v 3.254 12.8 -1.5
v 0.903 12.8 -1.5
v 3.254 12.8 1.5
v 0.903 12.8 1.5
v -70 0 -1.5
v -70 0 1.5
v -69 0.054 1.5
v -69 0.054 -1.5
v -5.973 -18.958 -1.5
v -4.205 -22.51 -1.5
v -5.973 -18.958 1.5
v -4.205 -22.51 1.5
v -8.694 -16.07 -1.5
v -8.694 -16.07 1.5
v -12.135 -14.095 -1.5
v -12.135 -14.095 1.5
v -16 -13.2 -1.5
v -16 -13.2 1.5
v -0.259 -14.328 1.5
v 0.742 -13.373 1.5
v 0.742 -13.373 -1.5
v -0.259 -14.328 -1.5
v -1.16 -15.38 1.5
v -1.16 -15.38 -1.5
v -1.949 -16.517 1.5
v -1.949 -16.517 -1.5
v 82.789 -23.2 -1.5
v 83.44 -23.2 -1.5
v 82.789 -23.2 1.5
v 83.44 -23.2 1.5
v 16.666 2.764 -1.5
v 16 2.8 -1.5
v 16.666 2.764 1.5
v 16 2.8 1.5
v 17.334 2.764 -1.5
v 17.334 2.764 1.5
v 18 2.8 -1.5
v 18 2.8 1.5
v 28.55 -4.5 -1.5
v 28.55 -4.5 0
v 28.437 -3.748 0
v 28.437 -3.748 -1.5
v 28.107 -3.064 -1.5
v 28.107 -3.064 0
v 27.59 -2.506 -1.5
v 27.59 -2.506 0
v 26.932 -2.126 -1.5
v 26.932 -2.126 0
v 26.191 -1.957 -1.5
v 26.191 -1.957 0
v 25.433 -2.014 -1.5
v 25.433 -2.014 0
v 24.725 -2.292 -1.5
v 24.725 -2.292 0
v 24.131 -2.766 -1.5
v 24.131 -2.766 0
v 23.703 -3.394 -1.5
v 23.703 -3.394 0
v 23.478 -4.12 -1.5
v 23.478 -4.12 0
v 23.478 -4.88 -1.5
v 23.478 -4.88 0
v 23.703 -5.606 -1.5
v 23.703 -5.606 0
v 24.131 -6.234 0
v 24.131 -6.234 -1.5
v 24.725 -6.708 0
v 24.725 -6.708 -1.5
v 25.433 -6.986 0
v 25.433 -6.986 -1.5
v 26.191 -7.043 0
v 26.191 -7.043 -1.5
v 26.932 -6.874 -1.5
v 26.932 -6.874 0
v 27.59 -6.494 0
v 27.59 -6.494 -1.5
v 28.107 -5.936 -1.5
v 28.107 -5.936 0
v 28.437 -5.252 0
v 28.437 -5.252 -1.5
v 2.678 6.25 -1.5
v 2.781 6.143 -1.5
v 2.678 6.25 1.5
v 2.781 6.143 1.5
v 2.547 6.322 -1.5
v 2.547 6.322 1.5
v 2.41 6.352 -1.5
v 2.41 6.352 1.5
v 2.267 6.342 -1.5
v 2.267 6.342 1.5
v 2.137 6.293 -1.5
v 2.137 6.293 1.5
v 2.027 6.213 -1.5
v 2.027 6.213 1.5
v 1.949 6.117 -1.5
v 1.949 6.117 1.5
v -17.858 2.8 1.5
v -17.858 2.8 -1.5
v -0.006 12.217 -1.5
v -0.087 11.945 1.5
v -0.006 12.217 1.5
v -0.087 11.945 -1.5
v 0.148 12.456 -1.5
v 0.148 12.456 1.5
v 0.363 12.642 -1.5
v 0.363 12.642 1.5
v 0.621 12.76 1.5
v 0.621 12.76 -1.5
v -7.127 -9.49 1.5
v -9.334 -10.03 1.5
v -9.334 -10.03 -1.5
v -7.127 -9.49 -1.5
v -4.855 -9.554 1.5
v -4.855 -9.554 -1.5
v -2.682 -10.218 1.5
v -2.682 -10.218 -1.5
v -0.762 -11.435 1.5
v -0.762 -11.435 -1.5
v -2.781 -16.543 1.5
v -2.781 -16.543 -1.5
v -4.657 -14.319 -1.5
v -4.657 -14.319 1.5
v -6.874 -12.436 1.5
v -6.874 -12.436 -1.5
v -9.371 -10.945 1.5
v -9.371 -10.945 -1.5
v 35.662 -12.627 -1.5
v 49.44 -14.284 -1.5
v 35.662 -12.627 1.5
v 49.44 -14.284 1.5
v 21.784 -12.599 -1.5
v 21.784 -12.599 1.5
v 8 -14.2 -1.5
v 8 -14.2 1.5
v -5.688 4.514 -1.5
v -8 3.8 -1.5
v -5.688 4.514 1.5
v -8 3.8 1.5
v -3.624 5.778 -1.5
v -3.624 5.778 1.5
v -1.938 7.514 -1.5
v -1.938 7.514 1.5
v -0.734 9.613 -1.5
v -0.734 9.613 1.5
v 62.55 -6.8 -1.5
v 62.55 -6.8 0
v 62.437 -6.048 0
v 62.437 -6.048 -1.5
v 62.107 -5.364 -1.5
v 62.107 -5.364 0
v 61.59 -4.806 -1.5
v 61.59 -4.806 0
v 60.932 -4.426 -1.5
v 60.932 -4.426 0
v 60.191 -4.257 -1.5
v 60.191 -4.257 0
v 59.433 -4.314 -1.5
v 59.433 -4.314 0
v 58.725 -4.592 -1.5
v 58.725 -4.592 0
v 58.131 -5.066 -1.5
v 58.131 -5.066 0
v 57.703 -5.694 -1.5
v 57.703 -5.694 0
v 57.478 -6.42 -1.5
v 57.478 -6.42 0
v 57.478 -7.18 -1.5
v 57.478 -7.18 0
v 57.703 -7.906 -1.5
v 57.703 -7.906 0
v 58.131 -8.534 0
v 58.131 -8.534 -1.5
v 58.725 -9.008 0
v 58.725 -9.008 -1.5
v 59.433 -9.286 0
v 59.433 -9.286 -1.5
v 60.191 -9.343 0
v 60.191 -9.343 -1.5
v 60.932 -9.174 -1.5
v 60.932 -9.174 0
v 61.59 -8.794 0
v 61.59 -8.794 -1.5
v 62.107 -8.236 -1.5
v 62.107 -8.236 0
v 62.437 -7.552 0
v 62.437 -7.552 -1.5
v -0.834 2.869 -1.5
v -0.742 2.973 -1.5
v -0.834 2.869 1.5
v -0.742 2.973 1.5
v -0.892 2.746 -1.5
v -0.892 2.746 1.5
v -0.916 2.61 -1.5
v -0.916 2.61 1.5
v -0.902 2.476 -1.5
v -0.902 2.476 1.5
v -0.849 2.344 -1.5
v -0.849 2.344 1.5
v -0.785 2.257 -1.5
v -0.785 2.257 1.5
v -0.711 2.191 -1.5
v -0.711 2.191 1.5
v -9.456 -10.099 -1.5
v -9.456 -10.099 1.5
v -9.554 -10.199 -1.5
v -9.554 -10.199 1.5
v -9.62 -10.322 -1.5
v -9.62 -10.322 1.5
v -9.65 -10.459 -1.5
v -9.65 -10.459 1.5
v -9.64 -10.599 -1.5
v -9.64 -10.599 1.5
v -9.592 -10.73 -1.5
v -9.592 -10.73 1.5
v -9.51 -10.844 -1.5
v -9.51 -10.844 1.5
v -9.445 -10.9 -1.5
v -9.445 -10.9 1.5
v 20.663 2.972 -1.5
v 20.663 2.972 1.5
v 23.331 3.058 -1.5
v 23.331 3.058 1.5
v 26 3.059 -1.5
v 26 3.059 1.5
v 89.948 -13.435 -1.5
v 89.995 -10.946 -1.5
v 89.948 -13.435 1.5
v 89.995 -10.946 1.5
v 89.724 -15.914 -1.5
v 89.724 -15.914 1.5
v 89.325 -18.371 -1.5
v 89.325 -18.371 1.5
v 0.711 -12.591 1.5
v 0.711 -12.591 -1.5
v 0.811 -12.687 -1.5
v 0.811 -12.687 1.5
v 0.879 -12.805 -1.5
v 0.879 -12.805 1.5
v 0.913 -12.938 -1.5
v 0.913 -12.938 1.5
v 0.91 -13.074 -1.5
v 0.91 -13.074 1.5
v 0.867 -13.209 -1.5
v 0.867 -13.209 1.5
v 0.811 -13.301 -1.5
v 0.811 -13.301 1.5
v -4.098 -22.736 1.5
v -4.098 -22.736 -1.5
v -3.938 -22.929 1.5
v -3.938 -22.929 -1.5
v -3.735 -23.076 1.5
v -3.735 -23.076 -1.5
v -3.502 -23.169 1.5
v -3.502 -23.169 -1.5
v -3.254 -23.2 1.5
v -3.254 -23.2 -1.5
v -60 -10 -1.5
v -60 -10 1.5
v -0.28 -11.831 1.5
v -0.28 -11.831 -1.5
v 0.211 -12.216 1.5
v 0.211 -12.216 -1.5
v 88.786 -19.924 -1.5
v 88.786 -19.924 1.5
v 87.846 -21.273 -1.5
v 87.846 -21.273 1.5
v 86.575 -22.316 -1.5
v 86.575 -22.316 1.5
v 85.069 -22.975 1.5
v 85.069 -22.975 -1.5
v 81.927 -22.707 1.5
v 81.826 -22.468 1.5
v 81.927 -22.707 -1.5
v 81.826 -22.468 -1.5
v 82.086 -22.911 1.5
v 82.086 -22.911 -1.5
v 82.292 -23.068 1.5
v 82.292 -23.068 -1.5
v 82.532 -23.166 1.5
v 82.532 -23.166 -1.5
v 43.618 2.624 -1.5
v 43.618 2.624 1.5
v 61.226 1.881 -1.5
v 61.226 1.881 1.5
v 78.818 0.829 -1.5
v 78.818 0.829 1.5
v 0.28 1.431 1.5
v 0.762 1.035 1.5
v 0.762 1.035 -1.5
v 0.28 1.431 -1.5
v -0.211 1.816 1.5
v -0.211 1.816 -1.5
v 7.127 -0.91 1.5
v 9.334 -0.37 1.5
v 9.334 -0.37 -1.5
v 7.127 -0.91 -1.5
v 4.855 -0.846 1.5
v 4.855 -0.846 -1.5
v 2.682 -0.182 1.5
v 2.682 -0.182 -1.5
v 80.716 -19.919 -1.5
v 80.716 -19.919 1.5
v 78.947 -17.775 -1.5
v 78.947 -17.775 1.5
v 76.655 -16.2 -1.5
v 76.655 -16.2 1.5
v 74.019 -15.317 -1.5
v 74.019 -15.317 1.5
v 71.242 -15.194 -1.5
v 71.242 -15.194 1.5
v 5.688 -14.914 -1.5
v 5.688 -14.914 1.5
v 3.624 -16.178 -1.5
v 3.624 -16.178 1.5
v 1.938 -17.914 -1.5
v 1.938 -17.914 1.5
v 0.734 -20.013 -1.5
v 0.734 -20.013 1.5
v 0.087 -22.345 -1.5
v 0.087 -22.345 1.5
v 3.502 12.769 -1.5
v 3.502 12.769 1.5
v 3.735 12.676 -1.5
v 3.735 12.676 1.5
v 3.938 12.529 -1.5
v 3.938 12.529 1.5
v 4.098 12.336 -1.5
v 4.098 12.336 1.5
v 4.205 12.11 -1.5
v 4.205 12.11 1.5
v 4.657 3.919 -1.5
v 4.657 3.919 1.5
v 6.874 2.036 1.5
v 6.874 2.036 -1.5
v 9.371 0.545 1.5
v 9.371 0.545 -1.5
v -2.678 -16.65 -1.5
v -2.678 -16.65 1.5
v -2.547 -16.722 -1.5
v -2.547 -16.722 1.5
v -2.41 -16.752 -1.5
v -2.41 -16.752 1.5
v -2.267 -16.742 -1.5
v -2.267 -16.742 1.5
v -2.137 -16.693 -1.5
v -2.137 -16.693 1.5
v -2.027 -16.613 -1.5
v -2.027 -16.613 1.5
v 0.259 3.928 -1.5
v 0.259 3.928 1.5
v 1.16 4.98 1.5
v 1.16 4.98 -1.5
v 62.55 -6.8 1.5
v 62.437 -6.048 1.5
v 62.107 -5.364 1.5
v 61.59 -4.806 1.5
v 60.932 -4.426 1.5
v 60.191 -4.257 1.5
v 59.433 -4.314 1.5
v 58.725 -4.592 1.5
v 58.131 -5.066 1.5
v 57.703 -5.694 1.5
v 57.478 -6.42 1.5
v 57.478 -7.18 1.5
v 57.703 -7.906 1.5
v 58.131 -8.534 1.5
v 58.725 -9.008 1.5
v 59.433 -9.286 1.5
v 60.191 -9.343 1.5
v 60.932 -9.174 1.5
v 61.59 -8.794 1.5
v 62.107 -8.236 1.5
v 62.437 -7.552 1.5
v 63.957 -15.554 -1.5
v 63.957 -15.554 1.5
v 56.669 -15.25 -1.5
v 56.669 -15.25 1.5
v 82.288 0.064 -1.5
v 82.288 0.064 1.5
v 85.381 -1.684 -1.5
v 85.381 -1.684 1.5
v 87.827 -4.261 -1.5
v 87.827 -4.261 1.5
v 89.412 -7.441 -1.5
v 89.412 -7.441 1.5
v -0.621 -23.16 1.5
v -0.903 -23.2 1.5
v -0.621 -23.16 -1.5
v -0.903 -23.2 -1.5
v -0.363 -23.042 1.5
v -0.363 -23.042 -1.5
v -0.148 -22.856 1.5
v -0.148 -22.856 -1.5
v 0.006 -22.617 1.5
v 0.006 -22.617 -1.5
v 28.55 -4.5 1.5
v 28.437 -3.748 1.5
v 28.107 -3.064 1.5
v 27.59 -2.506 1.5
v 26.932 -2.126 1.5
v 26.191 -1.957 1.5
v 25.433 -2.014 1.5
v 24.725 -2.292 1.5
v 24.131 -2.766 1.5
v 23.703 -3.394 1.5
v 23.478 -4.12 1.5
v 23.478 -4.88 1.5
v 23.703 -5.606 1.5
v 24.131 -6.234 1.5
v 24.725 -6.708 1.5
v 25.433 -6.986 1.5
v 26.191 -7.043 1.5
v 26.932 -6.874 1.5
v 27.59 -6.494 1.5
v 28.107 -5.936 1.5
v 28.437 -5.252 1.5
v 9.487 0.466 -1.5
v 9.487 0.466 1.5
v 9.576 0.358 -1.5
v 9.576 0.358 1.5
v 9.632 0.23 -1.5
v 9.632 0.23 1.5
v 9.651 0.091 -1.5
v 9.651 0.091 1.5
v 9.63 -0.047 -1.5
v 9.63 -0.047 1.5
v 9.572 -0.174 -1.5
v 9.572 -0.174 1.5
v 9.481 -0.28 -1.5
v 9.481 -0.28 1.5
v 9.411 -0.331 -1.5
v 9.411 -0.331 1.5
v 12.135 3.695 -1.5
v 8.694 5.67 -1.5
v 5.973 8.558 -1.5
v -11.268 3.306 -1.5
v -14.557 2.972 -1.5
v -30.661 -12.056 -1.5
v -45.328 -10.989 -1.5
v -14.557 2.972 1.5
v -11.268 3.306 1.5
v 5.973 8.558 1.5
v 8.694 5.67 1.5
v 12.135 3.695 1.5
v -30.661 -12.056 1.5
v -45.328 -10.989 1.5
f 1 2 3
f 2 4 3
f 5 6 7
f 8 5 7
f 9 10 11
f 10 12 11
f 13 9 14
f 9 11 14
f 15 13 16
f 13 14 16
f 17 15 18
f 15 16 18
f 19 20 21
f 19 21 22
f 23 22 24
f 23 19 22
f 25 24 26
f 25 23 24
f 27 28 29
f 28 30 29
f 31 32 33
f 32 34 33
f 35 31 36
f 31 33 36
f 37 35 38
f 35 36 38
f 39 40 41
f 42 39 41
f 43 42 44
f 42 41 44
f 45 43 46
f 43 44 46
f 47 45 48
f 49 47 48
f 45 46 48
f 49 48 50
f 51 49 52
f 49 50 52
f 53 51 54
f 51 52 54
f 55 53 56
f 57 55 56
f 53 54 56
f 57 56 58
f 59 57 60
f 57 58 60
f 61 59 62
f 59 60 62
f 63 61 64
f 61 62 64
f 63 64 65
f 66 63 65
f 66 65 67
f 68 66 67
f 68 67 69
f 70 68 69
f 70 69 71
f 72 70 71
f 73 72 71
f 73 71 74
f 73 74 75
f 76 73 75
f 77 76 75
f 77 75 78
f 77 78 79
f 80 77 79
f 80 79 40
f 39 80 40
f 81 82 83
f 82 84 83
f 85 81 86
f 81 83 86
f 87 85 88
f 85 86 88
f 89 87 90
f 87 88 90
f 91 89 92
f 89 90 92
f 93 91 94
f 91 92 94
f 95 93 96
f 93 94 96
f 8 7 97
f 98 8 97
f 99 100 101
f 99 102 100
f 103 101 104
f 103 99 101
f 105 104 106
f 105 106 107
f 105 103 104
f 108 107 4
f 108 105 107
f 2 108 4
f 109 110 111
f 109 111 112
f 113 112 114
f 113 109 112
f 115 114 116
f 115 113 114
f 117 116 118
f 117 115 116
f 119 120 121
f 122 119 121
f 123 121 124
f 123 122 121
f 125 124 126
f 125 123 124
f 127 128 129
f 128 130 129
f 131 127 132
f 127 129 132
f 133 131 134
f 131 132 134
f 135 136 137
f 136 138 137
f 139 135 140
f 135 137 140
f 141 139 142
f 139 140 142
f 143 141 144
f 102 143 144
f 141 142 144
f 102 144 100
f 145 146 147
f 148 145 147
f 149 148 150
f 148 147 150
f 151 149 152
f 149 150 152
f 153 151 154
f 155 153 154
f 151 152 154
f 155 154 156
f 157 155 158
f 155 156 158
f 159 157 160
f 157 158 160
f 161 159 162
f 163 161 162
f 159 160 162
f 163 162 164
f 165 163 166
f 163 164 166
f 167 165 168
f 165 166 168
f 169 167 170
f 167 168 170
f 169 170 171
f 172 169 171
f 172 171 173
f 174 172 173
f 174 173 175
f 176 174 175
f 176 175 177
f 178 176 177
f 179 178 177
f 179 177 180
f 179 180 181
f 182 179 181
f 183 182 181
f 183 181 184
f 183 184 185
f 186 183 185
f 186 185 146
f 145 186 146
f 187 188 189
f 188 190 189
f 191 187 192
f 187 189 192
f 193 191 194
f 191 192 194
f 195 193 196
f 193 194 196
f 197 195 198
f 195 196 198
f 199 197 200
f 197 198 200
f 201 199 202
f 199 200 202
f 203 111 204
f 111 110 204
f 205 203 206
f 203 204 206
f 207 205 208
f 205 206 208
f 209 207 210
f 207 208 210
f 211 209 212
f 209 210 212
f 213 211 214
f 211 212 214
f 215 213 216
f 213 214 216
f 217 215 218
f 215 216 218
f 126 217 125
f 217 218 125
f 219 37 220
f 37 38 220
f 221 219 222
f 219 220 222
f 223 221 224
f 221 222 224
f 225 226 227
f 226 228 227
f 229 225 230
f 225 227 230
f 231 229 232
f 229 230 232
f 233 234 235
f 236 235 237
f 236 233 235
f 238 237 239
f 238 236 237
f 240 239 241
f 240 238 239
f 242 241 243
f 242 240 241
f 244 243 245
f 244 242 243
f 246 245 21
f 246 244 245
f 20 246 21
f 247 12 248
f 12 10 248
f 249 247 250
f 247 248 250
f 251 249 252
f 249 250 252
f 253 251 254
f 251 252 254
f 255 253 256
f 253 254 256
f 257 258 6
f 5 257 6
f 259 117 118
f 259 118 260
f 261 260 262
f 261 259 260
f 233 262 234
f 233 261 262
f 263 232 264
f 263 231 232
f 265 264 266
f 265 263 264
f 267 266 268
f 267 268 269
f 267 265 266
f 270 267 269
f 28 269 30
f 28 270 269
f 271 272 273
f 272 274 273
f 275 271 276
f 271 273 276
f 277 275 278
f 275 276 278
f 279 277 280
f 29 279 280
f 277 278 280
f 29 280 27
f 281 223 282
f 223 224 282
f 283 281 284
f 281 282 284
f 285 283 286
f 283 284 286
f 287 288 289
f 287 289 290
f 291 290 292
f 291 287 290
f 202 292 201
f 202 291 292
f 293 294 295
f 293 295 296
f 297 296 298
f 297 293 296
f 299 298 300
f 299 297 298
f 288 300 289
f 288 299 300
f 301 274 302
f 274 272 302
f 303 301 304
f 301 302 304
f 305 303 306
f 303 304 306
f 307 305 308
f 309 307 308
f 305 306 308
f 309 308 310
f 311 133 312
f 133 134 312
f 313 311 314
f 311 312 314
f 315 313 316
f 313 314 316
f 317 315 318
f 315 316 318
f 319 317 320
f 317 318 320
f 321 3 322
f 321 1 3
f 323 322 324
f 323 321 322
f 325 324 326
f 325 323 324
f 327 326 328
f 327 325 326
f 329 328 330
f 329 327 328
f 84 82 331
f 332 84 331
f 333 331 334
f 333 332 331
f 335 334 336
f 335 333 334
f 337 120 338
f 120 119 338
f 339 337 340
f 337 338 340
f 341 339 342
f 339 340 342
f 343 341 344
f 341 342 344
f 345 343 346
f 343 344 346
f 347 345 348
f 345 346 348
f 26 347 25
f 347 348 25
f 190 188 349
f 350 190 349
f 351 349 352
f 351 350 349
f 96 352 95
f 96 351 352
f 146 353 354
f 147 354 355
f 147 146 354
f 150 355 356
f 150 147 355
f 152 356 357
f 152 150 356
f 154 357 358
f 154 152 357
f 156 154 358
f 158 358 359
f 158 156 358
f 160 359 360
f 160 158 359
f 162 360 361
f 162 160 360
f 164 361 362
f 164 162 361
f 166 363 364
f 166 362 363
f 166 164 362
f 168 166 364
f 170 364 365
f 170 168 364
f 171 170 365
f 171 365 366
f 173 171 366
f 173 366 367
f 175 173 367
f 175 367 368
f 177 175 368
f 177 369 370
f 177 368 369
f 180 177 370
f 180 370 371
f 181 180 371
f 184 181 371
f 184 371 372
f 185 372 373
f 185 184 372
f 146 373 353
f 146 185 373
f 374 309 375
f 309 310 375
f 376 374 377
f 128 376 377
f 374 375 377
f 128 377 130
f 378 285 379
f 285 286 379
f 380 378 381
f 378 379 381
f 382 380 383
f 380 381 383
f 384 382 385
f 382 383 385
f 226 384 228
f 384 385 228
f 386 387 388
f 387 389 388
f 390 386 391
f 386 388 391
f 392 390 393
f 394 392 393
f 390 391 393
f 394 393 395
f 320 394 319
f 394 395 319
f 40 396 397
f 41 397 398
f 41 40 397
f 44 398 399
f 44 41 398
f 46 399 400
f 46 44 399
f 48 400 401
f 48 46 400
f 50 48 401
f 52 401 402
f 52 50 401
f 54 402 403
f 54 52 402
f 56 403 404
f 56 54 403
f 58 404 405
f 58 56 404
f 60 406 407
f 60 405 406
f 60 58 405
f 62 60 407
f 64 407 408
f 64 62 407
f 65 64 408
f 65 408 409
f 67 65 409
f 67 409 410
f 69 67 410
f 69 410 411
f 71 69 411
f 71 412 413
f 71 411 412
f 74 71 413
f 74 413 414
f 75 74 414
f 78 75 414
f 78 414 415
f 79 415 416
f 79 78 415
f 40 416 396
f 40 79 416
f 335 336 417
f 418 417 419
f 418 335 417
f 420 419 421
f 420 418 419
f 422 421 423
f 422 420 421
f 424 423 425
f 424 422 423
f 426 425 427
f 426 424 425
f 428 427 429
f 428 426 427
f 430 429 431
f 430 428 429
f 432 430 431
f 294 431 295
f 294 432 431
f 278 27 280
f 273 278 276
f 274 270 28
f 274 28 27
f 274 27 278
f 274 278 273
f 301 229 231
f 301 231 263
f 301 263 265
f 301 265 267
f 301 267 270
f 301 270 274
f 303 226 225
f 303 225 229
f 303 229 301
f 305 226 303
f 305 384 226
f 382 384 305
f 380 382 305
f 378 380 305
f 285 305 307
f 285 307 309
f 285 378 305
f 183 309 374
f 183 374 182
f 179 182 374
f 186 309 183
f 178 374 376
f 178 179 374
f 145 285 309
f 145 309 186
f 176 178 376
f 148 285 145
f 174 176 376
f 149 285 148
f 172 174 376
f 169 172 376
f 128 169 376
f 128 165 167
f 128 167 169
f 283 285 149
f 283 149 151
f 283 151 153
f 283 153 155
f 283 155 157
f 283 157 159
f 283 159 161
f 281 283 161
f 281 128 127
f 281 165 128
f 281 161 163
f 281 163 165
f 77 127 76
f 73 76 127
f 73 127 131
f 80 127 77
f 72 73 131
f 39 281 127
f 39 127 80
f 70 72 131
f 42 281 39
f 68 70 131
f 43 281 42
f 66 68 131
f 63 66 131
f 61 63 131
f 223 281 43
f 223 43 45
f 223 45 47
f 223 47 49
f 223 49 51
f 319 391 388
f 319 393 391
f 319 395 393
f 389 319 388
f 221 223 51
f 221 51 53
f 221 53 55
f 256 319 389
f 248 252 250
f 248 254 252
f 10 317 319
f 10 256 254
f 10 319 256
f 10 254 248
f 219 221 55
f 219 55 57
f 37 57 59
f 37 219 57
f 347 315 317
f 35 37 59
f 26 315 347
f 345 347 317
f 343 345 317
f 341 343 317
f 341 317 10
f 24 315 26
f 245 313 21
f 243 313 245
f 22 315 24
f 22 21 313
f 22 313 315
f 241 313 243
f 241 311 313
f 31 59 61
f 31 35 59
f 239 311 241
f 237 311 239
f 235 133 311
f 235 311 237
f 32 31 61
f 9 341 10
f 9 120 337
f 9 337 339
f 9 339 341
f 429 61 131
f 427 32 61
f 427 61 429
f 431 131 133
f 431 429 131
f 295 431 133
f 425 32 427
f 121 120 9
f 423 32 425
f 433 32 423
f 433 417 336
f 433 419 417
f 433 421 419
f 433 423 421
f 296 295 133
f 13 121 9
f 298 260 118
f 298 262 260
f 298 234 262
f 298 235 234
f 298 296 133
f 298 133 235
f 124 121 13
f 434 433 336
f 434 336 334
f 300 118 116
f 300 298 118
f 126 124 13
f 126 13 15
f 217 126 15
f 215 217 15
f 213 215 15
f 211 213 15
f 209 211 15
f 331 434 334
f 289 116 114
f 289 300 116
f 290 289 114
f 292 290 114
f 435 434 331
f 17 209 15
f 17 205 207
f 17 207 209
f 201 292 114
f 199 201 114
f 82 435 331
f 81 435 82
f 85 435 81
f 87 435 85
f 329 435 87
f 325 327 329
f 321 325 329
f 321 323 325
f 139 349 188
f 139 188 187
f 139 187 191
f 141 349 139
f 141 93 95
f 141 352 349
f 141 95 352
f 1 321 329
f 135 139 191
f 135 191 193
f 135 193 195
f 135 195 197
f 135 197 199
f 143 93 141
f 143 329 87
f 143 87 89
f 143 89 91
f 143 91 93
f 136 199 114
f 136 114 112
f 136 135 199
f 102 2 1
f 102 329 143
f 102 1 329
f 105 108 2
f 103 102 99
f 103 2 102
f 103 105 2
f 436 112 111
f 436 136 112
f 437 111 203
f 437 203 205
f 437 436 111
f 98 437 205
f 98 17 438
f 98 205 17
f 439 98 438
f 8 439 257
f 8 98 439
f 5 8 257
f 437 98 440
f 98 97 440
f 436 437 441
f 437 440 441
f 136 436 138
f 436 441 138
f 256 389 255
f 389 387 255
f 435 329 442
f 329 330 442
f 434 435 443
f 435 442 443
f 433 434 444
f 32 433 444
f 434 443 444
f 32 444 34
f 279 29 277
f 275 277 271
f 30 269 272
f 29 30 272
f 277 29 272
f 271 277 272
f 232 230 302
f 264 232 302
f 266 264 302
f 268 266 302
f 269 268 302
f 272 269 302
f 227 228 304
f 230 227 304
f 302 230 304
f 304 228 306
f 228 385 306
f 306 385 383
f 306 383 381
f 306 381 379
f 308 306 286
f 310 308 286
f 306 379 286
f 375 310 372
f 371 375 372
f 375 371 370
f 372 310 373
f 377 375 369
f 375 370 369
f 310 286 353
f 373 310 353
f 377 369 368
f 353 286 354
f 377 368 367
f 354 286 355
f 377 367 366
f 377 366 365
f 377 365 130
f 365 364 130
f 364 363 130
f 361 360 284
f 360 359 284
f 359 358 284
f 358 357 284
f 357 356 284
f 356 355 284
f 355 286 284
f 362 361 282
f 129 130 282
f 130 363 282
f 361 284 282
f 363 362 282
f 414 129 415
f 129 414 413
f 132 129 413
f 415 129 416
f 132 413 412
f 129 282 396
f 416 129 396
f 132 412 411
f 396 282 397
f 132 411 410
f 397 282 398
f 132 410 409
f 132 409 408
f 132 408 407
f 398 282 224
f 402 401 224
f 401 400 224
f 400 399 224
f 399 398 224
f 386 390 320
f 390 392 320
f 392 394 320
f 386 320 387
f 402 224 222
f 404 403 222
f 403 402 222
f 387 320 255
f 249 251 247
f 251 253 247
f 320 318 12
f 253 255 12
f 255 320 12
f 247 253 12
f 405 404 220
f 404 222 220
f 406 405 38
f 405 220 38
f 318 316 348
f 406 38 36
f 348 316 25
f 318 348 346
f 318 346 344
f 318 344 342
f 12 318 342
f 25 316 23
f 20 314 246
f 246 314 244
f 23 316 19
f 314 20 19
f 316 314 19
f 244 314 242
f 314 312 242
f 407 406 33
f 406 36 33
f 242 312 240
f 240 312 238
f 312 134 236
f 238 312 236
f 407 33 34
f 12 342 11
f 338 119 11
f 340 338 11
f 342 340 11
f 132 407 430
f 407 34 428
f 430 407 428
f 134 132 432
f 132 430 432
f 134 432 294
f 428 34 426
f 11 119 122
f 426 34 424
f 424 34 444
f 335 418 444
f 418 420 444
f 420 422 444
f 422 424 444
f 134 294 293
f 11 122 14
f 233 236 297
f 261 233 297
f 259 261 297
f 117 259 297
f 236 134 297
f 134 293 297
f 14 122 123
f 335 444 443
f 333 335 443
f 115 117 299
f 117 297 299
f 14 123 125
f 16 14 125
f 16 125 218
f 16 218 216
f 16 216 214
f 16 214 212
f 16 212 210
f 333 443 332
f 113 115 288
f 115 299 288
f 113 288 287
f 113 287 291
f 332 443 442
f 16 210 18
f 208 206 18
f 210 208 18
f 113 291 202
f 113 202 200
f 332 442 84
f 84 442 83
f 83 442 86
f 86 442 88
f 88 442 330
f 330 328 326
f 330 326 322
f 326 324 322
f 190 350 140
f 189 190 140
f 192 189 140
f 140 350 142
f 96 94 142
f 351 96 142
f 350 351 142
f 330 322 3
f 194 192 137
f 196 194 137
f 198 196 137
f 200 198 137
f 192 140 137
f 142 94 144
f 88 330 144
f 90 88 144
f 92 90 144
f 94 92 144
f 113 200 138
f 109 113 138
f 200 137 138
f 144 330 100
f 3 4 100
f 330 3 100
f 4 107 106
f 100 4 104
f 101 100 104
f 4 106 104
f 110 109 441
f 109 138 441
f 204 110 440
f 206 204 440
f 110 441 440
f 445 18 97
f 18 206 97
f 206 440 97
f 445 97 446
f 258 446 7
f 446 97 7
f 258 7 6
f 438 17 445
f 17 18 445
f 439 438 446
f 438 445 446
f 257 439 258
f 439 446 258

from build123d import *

# Parameters (mm, degrees)
EXTRUDE_1_DEPTH          = 1.5
CUT_EXTRUDE_1_DEPTH      = 2.5
CUT_EXTRUDE_1_DEPTH_BACK = 2.5
FILLET_2_R               = 0.5
SKETCH_1_3_R             = 2.55
CUT_EXTRUDE_2_DEPTH      = 2.5000001
CUT_EXTRUDE_2_DEPTH_BACK = 2.5000001
FILLET_3_R               = 1
FILLET_4_R               = 6


with BuildPart() as part:
    # 草图3 → 凸台-拉伸1 (new body, symmetric)
    with BuildSketch(Plane.XY):
        with BuildLine():
            Line((-69, 0.053699407), (-17.857896917, 2.8))
            ThreePointArc((-17.857896917, 2.8), (-12.910589699, 3.119021237), (-8, 3.8))
            ThreePointArc((-8, 3.8), (-2.43432215, 6.908286356), (0, 12.8))
            Line((0, 12.8), (4, 12.8))
            ThreePointArc((4, 12.8), (8.414270073, 5.897124087), (16, 2.8))
            ThreePointArc((16, 2.8), (17, 2.759720994), (18, 2.8))
            ThreePointArc((18, 2.8), (21.996883494, 3.025702827), (26, 3.058530741))
            ThreePointArc((26, 3.058530741), (52.423511602, 2.290913304), (78.817734107, 0.82933187))
            ThreePointArc((78.817734107, 0.82933187), (86.700158242, -2.881010306), (89.995283198, -10.945835216))
            ThreePointArc((89.995283198, -10.945835216), (89.543787999, -17.161843843), (88, -23.2))
            Line((88, -23.2), (82, -23.2))
            ThreePointArc((82, -23.2), (78.162031949, -17.126267779), (71.242138758, -15.193575339))
            ThreePointArc((71.242138758, -15.193575339), (60.309670553, -15.485417284), (49.439553231, -14.283509554))
            ThreePointArc((49.439553231, -14.283509554), (28.723471343, -12.408337394), (8, -14.2))
            ThreePointArc((8, -14.2), (2.43432215, -17.308286356), (0, -23.2))
            Line((0, -23.2), (-4, -23.2))
            ThreePointArc((-4, -23.2), (-8.414270073, -16.297124087), (-16, -13.2))
            ThreePointArc((-16, -13.2), (-37.993667939, -11.512934158), (-60, -10))
            Line((-60, -10), (-70, 0))
            Line((-70, 0), (-69, 0.053699407))
        make_face()
    extrude(amount=EXTRUDE_1_DEPTH, both=True)

    # 草图1 → 切除-拉伸1 (cut, two sides)
    with BuildSketch(Plane.XY) as cut_extrude_1_sk:
        with BuildLine():
            ThreePointArc((10.342236489, 0.104989325), (5.407803908, -0.918324974), (0.762235002, 1.034746091))
            ThreePointArc((0.762235002, 1.034746091), (-0.220251061, 1.823323048), (-1.237764998, 2.566154029))
            ThreePointArc((-1.237764998, 2.566154029), (0.767930164, 4.495803013), (2.342236489, 6.790997533))
            ThreePointArc((2.342236489, 6.790997533), (5.834327754, 2.840266104), (10.342236489, 0.104989325))
        make_face()
        with BuildLine():
            ThreePointArc((-0.762235002, -11.434746091), (0.220251061, -12.223323048), (1.237764998, -12.966154029))
            ThreePointArc((1.237764998, -12.966154029), (-0.767930164, -14.895803013), (-2.342236489, -17.190997533))
            ThreePointArc((-2.342236489, -17.190997533), (-5.834327754, -13.240266104), (-10.342236489, -10.504989325))
            ThreePointArc((-10.342236489, -10.504989325), (-5.407803908, -9.481675026), (-0.762235002, -11.434746091))
        make_face()
    extrude(amount=CUT_EXTRUDE_1_DEPTH, mode=Mode.SUBTRACT)
    extrude(cut_extrude_1_sk.sketch, amount=-CUT_EXTRUDE_1_DEPTH_BACK, mode=Mode.SUBTRACT)

    # 圆角2
    fillet_2_edges = [part.edges().sort_by_distance(p)[0] for p in [
        (10.342236489, 0.104989325, 0),
        (-1.237764998, 2.566154029, 0),
        (2.342236489, 6.790997533, 0),
        (1.237764998, -12.966154029, 0),
        (-2.342236489, -17.190997533, 0),
        (-10.342236489, -10.504989325, 0),
    ]]
    fillet(fillet_2_edges, radius=FILLET_2_R)

    # 草图1<3> → 切除-拉伸2 (cut, two sides)
    with BuildSketch(Plane.XY) as cut_extrude_2_sk:
        with Locations((60, -6.8)):
            Circle(SKETCH_1_3_R)
        with Locations((26, -4.5)):
            Circle(SKETCH_1_3_R)
    extrude(amount=CUT_EXTRUDE_2_DEPTH, mode=Mode.SUBTRACT)
    extrude(cut_extrude_2_sk.sketch, amount=-CUT_EXTRUDE_2_DEPTH_BACK, mode=Mode.SUBTRACT)

    # 圆角3
    fillet_3_edges = [part.edges().sort_by_distance(p)[0] for p in [
        (0, 12.8, 0),
        (4, 12.8, 0),
        (82, -23.2, 0),
        (0, -23.2, 0),
        (-4, -23.2, 0),
    ]]
    fillet(fillet_3_edges, radius=FILLET_3_R)

    # 圆角4
    fillet_4_edges = [part.edges().sort_by_distance(p)[0] for p in [
        (88, -23.2, 0),
    ]]
    fillet(fillet_4_edges, radius=FILLET_4_R)


solid = part.part
